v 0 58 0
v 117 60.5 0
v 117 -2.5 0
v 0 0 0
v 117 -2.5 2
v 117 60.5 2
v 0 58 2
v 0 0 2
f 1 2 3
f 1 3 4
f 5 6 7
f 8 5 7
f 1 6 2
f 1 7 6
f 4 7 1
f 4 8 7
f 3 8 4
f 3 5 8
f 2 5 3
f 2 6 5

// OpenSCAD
//parametros
lMin = 58;
lMax = 63;
comp = 117;
altura = 2;
borda = 10;

//makePrincipal();
//makeTopo();
//makeTela();
makeTelaFechada();


// --------------------------------------------
module makePrincipal() {
    union() {
        body();

        addPinos();

        //addCruzado();
    }
}

module makeTopo() {
    difference() {
        body();

        addFuros();
    }
}

module makeTela() {
    union() {
        body();

        color("blue")
        translate([1,3,1])
        honeycomb(comp-borda, lMax-borda, altura, 3, 0.8); 
    }
}

module makeTelaFechada() {
    bodyExterno();
}

module body() {
    difference() {
        bodyExterno();
        bodyInterno();
    }
}

module bodyExterno() {
    linear_extrude(height=altura, center=false, convexity=10)
    polygon_body();
}

module bodyInterno() {
    translate([borda,borda,-1])
    linear_extrude(height=altura*2, center=false, convexity=10)
    polygon_body(borda);
}

module addCruzado() {
    translate([6,10,0])
    rotate([0,0,-67])
    cruzado();

    translate([6,50,0])
    rotate([0,0,-113])
    cruzado();
}

module cruzado() {
    color("red")
    cube([3,comp,altura]);
}

module addPinos() {
    MBorda = borda/2;
    bDir = MBorda;
    bEsq = lMin-MBorda;
    
    //esquerda
    translate([MBorda,bEsq,0])
    pino();

    translate([MBorda+(comp/2),bEsq+1,0])
    pino();

    translate([comp-2-MBorda,bEsq+2,0])
    pino();
    

    //direita
    translate([MBorda,bDir,0])
    pino();

    translate([MBorda+(comp/2),bDir-1,0])
    pino();

    translate([comp-2-MBorda,bDir-2,0])
    pino();
}

module pino() {
    translate([0,0,altura])
    difference() {
        cylinder(h=3.45, r=6/2, $fn=60);
        
        translate([-0.76,-3,0.45])
        cube([1.55,6,4]);
    }
}

module addFuros() {
    MBorda = borda/2;
    bDir = MBorda;
    bEsq = lMin-MBorda;
    
    //esquerda
    translate([MBorda,bEsq,0])
    furo();

    translate([MBorda+(comp/2),bEsq+1,0])
    furo();

    translate([comp-2-MBorda,bEsq+2,0])
    furo();
    

    //direita
    translate([MBorda,bDir,0])
    furo();

    translate([MBorda+(comp/2),bDir-1,0])
    furo();

    translate([comp-2-MBorda,bDir-2,0])
    furo();
}

module furo() {
    translate([0,0,-1])
    cylinder(h=altura+2, r=6/2, $fn=60);
}

module polygon_body(diferenca = 0) {
    diferenca = diferenca * 2;
    lMin = (lMin - diferenca);
    lMax = (lMax - diferenca);
    comp = 117 - (diferenca * 1.2);
    lDif = (lMax - lMin) / 2;

    polygon([[0,0],[comp,-lDif],[comp,lMin+lDif],[0,lMin]]);
}






module hc_column(length, cell_size, wall_thickness) {
        no_of_cells = floor(length / (cell_size + wall_thickness)) ;

        for (i = [0 : no_of_cells]) {
                translate([0,(i * (cell_size + wall_thickness)),0])
                         circle($fn = 6, r = cell_size * (sqrt(3)/3));
        }
}

module honeycomb (length, width, height, cell_size, wall_thickness) {
        no_of_rows = floor(1.2 * length / (cell_size +
wall_thickness)) ;

        tr_mod = cell_size + wall_thickness;
        tr_x = sqrt(3)/2 * tr_mod;
        tr_y = tr_mod / 2;
        off_x = -1 * wall_thickness / 2;
        off_y = wall_thickness / 2;
        linear_extrude(height = height, center = true, convexity = 10,
twist = 0, slices = 1)
                difference(){
                        square([length, width]);
                        for (i = [0 : no_of_rows]) {
                                translate([i * tr_x + off_x, (i % 2) *
tr_y + off_y,0])
                                        hc_column(width, cell_size,
wall_thickness);
                        }
                }
}
